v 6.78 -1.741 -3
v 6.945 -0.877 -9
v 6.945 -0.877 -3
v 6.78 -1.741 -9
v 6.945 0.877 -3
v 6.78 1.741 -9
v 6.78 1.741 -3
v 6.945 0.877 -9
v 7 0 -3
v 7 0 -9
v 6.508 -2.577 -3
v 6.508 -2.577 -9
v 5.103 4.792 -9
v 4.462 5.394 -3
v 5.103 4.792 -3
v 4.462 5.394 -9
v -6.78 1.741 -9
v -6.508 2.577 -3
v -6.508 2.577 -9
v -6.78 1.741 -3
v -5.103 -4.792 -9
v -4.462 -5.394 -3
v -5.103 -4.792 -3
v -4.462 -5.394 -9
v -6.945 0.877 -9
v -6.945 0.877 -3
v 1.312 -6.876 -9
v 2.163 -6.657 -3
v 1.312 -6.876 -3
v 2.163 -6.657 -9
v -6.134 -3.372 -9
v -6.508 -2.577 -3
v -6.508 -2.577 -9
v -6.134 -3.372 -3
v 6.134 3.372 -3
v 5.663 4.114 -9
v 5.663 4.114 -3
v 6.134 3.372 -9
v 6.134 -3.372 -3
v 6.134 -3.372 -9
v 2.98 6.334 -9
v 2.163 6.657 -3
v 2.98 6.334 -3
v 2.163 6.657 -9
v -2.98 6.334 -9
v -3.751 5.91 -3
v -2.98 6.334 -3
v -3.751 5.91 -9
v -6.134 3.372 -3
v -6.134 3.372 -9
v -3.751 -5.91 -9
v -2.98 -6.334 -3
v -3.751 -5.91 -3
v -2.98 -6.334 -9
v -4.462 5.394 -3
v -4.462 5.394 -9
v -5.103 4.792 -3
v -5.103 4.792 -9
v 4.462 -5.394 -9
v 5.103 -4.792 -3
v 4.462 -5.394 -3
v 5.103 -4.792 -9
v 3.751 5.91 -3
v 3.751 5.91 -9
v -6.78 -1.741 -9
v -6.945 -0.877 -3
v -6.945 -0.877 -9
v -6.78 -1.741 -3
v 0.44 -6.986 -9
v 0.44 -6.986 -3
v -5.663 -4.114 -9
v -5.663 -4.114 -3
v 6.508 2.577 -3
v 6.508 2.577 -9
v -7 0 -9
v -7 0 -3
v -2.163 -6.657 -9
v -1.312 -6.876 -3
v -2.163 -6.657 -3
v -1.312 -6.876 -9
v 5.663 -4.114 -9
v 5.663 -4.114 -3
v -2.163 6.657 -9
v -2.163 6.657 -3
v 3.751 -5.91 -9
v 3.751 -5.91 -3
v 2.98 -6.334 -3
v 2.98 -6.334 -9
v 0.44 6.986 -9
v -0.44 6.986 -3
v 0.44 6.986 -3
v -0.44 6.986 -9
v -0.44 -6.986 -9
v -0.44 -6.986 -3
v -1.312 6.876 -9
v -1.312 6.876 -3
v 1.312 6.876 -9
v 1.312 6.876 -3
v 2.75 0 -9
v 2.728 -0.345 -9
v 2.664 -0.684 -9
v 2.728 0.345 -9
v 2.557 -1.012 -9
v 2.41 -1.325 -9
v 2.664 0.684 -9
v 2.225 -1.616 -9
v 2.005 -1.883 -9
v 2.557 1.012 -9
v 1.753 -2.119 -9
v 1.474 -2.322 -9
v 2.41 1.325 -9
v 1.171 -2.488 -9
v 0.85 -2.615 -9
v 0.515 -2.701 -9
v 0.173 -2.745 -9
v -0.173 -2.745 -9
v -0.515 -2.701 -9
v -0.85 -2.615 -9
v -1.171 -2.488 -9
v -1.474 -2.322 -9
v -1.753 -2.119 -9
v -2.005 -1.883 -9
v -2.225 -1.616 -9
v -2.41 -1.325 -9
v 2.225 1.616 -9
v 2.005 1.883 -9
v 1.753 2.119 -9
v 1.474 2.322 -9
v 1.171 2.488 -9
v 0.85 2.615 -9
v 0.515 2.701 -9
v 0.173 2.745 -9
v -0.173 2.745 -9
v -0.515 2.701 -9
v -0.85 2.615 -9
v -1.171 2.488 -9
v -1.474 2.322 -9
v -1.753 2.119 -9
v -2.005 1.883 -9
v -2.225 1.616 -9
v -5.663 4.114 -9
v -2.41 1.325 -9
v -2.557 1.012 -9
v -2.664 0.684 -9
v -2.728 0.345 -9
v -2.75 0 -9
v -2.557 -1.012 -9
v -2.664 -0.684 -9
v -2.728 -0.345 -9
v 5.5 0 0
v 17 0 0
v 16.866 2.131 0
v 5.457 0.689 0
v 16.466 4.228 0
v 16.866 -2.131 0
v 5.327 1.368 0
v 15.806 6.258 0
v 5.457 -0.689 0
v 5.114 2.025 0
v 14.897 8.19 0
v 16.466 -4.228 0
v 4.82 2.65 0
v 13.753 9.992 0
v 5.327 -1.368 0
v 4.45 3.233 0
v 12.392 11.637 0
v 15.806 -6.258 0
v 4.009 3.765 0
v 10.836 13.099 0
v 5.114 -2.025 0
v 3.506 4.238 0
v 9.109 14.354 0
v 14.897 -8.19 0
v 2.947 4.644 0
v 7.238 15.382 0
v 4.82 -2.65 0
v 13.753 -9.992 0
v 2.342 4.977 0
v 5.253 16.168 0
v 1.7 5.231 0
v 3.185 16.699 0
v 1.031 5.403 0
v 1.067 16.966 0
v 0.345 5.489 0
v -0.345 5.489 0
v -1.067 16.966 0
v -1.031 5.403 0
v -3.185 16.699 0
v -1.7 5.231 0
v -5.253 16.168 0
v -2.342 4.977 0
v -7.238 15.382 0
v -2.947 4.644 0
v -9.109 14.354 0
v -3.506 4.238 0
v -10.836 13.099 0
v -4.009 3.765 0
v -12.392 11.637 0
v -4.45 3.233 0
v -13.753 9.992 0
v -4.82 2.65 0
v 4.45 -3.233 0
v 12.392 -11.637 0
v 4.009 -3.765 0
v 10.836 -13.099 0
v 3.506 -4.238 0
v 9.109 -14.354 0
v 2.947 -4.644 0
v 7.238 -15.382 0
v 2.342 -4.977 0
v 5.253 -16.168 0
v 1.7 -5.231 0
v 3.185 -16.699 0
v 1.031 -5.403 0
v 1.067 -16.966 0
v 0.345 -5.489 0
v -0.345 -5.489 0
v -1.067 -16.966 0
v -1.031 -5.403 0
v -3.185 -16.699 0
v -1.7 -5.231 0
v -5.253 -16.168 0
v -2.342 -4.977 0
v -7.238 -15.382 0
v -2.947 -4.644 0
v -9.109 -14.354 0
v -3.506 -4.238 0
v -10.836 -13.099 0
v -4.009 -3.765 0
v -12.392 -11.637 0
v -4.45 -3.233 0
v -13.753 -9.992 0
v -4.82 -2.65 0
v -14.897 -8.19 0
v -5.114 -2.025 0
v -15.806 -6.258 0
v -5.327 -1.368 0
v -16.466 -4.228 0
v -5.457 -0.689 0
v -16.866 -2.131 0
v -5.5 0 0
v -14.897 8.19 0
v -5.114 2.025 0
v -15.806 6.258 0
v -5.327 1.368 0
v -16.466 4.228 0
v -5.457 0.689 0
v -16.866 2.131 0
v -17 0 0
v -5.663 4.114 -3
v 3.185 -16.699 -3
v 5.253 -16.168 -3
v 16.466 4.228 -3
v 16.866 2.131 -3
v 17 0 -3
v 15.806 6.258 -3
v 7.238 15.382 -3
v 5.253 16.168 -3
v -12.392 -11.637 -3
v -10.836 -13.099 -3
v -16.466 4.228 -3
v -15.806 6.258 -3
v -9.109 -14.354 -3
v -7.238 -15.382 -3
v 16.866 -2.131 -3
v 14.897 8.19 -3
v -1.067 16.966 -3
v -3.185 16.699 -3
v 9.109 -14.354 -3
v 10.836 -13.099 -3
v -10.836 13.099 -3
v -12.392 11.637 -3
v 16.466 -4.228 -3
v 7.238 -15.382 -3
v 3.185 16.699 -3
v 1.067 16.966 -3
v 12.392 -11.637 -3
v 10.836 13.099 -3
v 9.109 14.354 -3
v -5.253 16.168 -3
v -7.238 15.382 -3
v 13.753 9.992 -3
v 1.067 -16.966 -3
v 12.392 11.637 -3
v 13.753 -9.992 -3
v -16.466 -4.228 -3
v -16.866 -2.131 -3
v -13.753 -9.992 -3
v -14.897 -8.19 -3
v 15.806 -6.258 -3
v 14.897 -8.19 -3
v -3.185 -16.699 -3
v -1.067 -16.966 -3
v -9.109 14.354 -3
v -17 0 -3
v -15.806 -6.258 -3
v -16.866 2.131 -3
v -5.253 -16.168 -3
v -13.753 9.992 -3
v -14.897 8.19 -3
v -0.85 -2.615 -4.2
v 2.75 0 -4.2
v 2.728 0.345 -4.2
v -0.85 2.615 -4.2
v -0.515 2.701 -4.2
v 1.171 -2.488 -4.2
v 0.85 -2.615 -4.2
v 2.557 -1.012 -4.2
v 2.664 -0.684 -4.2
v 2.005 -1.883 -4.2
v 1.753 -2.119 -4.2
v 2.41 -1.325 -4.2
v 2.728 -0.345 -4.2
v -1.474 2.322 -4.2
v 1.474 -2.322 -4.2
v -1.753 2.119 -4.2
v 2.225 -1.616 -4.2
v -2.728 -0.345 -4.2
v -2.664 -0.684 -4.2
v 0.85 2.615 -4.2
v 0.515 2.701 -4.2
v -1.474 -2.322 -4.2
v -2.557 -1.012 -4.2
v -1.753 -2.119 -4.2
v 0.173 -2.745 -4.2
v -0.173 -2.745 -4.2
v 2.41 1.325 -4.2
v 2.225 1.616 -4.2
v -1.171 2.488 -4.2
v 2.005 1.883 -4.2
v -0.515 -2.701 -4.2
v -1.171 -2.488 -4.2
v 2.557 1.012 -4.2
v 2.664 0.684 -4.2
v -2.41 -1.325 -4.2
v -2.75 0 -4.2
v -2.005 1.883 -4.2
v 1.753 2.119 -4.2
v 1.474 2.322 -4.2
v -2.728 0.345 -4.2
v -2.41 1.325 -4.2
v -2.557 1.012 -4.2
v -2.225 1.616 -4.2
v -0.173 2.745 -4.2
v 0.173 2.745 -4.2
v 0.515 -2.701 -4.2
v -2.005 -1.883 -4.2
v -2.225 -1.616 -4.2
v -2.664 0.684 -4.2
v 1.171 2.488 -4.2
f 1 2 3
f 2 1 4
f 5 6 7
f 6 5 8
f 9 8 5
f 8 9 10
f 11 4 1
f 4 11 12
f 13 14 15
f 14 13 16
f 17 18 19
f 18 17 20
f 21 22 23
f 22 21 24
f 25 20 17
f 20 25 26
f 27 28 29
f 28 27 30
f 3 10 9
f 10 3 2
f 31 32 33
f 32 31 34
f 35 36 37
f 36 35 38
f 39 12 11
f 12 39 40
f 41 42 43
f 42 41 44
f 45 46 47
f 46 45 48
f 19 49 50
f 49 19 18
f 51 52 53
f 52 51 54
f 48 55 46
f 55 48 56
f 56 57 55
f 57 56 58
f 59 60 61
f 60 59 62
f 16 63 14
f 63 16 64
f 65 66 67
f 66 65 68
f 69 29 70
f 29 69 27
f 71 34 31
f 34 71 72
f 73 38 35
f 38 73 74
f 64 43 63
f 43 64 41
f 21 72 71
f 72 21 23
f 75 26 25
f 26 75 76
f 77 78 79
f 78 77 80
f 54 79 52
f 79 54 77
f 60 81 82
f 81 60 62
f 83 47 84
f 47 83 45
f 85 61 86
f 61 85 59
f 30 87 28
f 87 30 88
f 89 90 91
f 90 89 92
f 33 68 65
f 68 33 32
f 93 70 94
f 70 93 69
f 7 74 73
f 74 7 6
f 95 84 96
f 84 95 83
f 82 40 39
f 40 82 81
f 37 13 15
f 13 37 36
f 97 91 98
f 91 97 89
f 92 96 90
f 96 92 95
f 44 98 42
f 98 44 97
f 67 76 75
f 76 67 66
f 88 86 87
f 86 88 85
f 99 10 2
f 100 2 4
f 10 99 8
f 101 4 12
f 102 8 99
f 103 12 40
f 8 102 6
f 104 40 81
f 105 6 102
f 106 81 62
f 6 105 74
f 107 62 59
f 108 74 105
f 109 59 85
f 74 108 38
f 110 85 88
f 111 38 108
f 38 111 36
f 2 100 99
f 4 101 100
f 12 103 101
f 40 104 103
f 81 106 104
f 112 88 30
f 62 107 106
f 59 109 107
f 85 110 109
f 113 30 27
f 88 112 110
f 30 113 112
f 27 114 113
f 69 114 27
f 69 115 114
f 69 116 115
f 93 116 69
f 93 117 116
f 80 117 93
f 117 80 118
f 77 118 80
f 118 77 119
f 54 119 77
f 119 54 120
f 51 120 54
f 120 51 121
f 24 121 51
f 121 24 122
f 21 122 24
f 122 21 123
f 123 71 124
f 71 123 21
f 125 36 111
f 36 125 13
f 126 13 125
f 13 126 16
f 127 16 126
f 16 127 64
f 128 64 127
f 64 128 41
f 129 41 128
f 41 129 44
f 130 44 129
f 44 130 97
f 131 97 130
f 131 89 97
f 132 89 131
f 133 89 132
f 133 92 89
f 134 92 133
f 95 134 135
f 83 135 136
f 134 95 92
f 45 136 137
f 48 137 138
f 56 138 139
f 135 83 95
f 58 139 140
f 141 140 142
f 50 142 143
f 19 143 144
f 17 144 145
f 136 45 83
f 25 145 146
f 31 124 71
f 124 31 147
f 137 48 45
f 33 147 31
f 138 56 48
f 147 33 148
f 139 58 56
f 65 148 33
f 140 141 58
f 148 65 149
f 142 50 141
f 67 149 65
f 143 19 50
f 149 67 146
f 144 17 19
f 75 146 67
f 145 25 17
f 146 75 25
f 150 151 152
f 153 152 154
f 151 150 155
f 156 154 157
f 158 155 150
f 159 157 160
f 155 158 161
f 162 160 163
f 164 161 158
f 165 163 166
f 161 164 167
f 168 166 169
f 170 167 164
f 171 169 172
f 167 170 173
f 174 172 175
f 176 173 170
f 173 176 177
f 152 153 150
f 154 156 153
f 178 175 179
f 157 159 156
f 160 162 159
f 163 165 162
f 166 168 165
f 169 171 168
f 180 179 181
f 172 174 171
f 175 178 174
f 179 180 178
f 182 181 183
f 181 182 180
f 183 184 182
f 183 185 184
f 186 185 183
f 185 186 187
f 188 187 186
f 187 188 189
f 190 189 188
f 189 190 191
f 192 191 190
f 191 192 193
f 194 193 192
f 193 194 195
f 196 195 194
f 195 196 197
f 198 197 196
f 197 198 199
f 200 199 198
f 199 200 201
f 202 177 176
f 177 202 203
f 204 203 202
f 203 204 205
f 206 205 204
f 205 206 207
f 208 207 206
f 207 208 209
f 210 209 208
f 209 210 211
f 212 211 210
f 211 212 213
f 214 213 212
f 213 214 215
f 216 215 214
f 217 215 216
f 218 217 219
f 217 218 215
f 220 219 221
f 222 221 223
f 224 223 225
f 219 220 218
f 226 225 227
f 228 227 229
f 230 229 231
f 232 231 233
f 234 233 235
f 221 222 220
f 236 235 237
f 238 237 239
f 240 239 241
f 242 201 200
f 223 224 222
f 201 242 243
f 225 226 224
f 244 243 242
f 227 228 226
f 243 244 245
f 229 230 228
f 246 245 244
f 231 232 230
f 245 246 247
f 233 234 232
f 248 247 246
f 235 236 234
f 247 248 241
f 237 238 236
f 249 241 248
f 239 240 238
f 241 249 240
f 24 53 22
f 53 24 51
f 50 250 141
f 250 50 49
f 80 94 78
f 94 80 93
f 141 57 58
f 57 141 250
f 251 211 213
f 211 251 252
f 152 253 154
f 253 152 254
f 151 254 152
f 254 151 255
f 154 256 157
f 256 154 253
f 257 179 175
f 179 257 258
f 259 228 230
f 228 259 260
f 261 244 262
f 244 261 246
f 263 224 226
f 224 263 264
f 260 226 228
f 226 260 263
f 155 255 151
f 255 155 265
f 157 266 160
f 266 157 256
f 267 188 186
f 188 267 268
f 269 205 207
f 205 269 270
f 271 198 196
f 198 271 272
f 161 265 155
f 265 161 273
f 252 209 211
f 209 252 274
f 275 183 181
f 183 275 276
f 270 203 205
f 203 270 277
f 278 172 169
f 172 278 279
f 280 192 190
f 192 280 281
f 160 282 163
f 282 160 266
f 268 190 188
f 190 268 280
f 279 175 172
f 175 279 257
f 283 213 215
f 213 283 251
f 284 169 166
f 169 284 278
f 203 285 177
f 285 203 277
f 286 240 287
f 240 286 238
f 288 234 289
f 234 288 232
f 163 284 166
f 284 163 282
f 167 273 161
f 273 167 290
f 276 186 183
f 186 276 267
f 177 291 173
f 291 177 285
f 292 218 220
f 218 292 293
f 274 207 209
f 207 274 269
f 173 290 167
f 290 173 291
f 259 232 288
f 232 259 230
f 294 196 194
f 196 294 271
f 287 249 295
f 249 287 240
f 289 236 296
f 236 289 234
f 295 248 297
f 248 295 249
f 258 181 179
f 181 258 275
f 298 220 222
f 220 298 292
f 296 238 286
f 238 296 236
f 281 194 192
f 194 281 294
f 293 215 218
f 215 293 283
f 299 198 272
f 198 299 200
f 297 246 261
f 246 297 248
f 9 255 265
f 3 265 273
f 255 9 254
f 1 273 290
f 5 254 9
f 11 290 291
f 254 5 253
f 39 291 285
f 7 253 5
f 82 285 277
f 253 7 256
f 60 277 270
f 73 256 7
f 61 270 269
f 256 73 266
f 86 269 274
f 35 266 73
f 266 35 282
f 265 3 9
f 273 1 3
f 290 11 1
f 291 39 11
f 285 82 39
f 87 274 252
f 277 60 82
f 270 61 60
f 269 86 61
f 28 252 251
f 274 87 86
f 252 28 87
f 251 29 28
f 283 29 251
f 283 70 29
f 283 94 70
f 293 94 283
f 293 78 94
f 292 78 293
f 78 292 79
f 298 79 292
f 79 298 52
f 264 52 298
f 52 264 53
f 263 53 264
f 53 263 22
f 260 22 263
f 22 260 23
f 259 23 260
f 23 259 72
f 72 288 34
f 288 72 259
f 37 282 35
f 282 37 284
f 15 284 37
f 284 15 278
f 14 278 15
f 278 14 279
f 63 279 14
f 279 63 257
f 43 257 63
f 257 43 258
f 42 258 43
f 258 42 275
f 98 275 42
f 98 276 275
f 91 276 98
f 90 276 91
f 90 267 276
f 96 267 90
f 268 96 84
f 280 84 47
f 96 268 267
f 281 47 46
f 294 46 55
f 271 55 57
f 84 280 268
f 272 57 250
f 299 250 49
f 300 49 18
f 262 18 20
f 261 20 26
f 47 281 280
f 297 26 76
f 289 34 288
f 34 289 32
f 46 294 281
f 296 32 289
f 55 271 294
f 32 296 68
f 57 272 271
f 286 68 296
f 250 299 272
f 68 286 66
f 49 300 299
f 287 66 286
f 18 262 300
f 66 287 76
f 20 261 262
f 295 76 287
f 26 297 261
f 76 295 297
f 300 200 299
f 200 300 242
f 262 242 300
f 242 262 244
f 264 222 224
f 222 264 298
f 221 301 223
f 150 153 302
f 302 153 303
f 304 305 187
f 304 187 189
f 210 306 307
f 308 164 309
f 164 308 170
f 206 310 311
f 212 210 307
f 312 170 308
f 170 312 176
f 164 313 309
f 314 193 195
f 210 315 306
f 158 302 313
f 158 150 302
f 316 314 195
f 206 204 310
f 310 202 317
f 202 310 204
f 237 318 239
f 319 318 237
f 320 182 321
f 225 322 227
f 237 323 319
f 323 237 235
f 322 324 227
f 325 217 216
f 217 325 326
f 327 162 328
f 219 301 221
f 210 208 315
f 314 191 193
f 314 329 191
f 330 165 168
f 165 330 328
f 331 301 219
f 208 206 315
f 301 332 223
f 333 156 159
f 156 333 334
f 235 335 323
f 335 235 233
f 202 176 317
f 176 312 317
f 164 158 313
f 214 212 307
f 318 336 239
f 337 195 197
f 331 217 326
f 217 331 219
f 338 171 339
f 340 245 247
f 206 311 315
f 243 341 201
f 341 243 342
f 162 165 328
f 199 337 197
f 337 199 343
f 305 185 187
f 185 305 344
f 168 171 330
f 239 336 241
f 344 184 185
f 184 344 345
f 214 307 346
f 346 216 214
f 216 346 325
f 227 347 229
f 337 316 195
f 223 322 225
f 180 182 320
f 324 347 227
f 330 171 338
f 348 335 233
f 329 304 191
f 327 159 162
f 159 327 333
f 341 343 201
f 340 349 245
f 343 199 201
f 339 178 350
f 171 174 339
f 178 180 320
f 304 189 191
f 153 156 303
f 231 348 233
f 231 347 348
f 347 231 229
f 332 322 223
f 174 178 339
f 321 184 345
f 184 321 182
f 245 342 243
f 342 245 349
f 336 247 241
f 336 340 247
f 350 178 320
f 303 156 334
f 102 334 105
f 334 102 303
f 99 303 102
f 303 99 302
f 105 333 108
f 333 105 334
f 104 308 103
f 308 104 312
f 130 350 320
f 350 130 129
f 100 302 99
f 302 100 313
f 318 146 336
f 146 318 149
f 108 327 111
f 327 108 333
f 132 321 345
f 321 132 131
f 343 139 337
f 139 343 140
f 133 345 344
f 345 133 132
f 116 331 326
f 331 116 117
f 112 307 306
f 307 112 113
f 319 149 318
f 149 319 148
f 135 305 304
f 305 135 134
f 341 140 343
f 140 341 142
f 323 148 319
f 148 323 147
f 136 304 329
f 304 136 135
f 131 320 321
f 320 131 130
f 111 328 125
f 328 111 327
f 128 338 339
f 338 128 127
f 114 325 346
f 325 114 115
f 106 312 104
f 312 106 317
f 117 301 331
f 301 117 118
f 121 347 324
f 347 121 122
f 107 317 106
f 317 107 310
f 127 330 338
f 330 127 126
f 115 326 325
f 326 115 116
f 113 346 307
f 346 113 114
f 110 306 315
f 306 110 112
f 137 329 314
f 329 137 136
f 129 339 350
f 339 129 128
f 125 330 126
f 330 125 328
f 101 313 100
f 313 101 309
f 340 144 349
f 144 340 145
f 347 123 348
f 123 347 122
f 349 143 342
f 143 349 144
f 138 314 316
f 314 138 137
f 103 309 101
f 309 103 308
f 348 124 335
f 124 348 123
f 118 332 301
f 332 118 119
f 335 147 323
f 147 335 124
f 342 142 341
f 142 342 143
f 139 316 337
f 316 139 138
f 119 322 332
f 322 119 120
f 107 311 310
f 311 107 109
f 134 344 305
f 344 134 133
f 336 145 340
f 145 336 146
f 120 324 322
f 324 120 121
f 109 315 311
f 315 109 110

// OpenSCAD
$fn = 50;


difference() {
	union() {
		translate(v = [0, 0, -9.0000000000]) {
			cylinder(h = 9, r = 7.0000000000);
		}
		translate(v = [0, 0, -3.0000000000]) {
			cylinder(h = 3, r = 17.0000000000);
		}
	}
	union() {
		translate(v = [0, 0, 0]) {
			rotate(a = [0, 0, 0]) {
				difference() {
					union() {
						#translate(v = [0, 0, -9.0000000000]) {
							cylinder(h = 9, r = 2.2500000000);
						}
						#translate(v = [0, 0, -4.2000000000]) {
							cylinder(h = 4.2000000000, r1 = 2.7500000000, r2 = 5.5000000000);
						}
						#translate(v = [0, 0, -9.0000000000]) {
							cylinder(h = 9, r = 2.7500000000);
						}
						#translate(v = [0, 0, -9.0000000000]) {
							cylinder(h = 9, r = 2.2500000000);
						}
					}
					union();
				}
			}
		}
	}
}
